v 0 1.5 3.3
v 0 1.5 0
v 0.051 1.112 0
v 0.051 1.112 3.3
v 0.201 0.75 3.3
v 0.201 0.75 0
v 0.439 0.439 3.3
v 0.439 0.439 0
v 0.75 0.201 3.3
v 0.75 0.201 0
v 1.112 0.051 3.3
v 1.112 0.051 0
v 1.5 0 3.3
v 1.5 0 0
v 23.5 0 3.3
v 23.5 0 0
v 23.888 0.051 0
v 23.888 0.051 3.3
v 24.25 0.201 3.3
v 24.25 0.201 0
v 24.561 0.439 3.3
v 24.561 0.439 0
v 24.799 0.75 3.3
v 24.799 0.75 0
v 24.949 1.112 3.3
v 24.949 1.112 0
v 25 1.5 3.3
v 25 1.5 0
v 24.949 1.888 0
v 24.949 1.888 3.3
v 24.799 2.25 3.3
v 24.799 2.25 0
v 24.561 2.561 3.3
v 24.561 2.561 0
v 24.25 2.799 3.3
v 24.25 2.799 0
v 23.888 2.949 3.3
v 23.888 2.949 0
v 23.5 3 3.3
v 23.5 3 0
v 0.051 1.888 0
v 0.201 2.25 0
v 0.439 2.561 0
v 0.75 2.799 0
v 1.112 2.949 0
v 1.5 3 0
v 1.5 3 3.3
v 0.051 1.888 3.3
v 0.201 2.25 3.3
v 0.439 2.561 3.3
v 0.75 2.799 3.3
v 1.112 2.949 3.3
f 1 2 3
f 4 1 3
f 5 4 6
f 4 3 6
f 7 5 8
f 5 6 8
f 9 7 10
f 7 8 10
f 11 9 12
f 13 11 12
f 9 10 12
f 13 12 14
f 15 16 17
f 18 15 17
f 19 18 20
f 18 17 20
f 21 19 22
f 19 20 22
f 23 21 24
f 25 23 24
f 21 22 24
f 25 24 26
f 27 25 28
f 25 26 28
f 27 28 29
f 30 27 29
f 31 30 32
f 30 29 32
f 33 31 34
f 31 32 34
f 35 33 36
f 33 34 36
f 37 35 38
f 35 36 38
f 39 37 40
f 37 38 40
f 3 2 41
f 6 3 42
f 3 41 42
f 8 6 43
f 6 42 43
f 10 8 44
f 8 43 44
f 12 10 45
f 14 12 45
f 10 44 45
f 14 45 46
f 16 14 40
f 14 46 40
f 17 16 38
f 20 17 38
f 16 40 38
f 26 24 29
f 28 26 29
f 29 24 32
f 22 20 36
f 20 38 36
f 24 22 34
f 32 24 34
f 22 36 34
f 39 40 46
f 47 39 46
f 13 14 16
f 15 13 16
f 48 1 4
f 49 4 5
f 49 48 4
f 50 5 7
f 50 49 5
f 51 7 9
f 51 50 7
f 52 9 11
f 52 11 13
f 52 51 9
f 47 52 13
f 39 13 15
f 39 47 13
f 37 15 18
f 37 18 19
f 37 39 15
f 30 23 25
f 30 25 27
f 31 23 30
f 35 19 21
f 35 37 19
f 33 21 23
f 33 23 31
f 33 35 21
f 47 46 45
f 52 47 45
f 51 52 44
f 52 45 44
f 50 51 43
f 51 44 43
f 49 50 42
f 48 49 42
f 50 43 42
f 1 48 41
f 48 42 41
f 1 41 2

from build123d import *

# Parameters (mm, degrees)
F1_DEPTH = 3.3


with BuildPart() as f1:
    # F0 (on Top) → F1 (new body)
    with BuildSketch(Plane.XY):
        with BuildLine():
            ThreePointArc((0, 1.5), (0.43934, 0.43934), (1.5, 0))
            Line((1.5, 0), (23.5, 0))
            ThreePointArc((23.5, 0), (24.56066, 0.43934), (25, 1.5))
            ThreePointArc((25, 1.5), (24.56066, 2.56066), (23.5, 3))
            Line((23.5, 3), (1.5, 3))
            ThreePointArc((1.5, 3), (0.43934, 2.56066), (0, 1.5))
        make_face()
    extrude(amount=F1_DEPTH)


solid = f1.part
